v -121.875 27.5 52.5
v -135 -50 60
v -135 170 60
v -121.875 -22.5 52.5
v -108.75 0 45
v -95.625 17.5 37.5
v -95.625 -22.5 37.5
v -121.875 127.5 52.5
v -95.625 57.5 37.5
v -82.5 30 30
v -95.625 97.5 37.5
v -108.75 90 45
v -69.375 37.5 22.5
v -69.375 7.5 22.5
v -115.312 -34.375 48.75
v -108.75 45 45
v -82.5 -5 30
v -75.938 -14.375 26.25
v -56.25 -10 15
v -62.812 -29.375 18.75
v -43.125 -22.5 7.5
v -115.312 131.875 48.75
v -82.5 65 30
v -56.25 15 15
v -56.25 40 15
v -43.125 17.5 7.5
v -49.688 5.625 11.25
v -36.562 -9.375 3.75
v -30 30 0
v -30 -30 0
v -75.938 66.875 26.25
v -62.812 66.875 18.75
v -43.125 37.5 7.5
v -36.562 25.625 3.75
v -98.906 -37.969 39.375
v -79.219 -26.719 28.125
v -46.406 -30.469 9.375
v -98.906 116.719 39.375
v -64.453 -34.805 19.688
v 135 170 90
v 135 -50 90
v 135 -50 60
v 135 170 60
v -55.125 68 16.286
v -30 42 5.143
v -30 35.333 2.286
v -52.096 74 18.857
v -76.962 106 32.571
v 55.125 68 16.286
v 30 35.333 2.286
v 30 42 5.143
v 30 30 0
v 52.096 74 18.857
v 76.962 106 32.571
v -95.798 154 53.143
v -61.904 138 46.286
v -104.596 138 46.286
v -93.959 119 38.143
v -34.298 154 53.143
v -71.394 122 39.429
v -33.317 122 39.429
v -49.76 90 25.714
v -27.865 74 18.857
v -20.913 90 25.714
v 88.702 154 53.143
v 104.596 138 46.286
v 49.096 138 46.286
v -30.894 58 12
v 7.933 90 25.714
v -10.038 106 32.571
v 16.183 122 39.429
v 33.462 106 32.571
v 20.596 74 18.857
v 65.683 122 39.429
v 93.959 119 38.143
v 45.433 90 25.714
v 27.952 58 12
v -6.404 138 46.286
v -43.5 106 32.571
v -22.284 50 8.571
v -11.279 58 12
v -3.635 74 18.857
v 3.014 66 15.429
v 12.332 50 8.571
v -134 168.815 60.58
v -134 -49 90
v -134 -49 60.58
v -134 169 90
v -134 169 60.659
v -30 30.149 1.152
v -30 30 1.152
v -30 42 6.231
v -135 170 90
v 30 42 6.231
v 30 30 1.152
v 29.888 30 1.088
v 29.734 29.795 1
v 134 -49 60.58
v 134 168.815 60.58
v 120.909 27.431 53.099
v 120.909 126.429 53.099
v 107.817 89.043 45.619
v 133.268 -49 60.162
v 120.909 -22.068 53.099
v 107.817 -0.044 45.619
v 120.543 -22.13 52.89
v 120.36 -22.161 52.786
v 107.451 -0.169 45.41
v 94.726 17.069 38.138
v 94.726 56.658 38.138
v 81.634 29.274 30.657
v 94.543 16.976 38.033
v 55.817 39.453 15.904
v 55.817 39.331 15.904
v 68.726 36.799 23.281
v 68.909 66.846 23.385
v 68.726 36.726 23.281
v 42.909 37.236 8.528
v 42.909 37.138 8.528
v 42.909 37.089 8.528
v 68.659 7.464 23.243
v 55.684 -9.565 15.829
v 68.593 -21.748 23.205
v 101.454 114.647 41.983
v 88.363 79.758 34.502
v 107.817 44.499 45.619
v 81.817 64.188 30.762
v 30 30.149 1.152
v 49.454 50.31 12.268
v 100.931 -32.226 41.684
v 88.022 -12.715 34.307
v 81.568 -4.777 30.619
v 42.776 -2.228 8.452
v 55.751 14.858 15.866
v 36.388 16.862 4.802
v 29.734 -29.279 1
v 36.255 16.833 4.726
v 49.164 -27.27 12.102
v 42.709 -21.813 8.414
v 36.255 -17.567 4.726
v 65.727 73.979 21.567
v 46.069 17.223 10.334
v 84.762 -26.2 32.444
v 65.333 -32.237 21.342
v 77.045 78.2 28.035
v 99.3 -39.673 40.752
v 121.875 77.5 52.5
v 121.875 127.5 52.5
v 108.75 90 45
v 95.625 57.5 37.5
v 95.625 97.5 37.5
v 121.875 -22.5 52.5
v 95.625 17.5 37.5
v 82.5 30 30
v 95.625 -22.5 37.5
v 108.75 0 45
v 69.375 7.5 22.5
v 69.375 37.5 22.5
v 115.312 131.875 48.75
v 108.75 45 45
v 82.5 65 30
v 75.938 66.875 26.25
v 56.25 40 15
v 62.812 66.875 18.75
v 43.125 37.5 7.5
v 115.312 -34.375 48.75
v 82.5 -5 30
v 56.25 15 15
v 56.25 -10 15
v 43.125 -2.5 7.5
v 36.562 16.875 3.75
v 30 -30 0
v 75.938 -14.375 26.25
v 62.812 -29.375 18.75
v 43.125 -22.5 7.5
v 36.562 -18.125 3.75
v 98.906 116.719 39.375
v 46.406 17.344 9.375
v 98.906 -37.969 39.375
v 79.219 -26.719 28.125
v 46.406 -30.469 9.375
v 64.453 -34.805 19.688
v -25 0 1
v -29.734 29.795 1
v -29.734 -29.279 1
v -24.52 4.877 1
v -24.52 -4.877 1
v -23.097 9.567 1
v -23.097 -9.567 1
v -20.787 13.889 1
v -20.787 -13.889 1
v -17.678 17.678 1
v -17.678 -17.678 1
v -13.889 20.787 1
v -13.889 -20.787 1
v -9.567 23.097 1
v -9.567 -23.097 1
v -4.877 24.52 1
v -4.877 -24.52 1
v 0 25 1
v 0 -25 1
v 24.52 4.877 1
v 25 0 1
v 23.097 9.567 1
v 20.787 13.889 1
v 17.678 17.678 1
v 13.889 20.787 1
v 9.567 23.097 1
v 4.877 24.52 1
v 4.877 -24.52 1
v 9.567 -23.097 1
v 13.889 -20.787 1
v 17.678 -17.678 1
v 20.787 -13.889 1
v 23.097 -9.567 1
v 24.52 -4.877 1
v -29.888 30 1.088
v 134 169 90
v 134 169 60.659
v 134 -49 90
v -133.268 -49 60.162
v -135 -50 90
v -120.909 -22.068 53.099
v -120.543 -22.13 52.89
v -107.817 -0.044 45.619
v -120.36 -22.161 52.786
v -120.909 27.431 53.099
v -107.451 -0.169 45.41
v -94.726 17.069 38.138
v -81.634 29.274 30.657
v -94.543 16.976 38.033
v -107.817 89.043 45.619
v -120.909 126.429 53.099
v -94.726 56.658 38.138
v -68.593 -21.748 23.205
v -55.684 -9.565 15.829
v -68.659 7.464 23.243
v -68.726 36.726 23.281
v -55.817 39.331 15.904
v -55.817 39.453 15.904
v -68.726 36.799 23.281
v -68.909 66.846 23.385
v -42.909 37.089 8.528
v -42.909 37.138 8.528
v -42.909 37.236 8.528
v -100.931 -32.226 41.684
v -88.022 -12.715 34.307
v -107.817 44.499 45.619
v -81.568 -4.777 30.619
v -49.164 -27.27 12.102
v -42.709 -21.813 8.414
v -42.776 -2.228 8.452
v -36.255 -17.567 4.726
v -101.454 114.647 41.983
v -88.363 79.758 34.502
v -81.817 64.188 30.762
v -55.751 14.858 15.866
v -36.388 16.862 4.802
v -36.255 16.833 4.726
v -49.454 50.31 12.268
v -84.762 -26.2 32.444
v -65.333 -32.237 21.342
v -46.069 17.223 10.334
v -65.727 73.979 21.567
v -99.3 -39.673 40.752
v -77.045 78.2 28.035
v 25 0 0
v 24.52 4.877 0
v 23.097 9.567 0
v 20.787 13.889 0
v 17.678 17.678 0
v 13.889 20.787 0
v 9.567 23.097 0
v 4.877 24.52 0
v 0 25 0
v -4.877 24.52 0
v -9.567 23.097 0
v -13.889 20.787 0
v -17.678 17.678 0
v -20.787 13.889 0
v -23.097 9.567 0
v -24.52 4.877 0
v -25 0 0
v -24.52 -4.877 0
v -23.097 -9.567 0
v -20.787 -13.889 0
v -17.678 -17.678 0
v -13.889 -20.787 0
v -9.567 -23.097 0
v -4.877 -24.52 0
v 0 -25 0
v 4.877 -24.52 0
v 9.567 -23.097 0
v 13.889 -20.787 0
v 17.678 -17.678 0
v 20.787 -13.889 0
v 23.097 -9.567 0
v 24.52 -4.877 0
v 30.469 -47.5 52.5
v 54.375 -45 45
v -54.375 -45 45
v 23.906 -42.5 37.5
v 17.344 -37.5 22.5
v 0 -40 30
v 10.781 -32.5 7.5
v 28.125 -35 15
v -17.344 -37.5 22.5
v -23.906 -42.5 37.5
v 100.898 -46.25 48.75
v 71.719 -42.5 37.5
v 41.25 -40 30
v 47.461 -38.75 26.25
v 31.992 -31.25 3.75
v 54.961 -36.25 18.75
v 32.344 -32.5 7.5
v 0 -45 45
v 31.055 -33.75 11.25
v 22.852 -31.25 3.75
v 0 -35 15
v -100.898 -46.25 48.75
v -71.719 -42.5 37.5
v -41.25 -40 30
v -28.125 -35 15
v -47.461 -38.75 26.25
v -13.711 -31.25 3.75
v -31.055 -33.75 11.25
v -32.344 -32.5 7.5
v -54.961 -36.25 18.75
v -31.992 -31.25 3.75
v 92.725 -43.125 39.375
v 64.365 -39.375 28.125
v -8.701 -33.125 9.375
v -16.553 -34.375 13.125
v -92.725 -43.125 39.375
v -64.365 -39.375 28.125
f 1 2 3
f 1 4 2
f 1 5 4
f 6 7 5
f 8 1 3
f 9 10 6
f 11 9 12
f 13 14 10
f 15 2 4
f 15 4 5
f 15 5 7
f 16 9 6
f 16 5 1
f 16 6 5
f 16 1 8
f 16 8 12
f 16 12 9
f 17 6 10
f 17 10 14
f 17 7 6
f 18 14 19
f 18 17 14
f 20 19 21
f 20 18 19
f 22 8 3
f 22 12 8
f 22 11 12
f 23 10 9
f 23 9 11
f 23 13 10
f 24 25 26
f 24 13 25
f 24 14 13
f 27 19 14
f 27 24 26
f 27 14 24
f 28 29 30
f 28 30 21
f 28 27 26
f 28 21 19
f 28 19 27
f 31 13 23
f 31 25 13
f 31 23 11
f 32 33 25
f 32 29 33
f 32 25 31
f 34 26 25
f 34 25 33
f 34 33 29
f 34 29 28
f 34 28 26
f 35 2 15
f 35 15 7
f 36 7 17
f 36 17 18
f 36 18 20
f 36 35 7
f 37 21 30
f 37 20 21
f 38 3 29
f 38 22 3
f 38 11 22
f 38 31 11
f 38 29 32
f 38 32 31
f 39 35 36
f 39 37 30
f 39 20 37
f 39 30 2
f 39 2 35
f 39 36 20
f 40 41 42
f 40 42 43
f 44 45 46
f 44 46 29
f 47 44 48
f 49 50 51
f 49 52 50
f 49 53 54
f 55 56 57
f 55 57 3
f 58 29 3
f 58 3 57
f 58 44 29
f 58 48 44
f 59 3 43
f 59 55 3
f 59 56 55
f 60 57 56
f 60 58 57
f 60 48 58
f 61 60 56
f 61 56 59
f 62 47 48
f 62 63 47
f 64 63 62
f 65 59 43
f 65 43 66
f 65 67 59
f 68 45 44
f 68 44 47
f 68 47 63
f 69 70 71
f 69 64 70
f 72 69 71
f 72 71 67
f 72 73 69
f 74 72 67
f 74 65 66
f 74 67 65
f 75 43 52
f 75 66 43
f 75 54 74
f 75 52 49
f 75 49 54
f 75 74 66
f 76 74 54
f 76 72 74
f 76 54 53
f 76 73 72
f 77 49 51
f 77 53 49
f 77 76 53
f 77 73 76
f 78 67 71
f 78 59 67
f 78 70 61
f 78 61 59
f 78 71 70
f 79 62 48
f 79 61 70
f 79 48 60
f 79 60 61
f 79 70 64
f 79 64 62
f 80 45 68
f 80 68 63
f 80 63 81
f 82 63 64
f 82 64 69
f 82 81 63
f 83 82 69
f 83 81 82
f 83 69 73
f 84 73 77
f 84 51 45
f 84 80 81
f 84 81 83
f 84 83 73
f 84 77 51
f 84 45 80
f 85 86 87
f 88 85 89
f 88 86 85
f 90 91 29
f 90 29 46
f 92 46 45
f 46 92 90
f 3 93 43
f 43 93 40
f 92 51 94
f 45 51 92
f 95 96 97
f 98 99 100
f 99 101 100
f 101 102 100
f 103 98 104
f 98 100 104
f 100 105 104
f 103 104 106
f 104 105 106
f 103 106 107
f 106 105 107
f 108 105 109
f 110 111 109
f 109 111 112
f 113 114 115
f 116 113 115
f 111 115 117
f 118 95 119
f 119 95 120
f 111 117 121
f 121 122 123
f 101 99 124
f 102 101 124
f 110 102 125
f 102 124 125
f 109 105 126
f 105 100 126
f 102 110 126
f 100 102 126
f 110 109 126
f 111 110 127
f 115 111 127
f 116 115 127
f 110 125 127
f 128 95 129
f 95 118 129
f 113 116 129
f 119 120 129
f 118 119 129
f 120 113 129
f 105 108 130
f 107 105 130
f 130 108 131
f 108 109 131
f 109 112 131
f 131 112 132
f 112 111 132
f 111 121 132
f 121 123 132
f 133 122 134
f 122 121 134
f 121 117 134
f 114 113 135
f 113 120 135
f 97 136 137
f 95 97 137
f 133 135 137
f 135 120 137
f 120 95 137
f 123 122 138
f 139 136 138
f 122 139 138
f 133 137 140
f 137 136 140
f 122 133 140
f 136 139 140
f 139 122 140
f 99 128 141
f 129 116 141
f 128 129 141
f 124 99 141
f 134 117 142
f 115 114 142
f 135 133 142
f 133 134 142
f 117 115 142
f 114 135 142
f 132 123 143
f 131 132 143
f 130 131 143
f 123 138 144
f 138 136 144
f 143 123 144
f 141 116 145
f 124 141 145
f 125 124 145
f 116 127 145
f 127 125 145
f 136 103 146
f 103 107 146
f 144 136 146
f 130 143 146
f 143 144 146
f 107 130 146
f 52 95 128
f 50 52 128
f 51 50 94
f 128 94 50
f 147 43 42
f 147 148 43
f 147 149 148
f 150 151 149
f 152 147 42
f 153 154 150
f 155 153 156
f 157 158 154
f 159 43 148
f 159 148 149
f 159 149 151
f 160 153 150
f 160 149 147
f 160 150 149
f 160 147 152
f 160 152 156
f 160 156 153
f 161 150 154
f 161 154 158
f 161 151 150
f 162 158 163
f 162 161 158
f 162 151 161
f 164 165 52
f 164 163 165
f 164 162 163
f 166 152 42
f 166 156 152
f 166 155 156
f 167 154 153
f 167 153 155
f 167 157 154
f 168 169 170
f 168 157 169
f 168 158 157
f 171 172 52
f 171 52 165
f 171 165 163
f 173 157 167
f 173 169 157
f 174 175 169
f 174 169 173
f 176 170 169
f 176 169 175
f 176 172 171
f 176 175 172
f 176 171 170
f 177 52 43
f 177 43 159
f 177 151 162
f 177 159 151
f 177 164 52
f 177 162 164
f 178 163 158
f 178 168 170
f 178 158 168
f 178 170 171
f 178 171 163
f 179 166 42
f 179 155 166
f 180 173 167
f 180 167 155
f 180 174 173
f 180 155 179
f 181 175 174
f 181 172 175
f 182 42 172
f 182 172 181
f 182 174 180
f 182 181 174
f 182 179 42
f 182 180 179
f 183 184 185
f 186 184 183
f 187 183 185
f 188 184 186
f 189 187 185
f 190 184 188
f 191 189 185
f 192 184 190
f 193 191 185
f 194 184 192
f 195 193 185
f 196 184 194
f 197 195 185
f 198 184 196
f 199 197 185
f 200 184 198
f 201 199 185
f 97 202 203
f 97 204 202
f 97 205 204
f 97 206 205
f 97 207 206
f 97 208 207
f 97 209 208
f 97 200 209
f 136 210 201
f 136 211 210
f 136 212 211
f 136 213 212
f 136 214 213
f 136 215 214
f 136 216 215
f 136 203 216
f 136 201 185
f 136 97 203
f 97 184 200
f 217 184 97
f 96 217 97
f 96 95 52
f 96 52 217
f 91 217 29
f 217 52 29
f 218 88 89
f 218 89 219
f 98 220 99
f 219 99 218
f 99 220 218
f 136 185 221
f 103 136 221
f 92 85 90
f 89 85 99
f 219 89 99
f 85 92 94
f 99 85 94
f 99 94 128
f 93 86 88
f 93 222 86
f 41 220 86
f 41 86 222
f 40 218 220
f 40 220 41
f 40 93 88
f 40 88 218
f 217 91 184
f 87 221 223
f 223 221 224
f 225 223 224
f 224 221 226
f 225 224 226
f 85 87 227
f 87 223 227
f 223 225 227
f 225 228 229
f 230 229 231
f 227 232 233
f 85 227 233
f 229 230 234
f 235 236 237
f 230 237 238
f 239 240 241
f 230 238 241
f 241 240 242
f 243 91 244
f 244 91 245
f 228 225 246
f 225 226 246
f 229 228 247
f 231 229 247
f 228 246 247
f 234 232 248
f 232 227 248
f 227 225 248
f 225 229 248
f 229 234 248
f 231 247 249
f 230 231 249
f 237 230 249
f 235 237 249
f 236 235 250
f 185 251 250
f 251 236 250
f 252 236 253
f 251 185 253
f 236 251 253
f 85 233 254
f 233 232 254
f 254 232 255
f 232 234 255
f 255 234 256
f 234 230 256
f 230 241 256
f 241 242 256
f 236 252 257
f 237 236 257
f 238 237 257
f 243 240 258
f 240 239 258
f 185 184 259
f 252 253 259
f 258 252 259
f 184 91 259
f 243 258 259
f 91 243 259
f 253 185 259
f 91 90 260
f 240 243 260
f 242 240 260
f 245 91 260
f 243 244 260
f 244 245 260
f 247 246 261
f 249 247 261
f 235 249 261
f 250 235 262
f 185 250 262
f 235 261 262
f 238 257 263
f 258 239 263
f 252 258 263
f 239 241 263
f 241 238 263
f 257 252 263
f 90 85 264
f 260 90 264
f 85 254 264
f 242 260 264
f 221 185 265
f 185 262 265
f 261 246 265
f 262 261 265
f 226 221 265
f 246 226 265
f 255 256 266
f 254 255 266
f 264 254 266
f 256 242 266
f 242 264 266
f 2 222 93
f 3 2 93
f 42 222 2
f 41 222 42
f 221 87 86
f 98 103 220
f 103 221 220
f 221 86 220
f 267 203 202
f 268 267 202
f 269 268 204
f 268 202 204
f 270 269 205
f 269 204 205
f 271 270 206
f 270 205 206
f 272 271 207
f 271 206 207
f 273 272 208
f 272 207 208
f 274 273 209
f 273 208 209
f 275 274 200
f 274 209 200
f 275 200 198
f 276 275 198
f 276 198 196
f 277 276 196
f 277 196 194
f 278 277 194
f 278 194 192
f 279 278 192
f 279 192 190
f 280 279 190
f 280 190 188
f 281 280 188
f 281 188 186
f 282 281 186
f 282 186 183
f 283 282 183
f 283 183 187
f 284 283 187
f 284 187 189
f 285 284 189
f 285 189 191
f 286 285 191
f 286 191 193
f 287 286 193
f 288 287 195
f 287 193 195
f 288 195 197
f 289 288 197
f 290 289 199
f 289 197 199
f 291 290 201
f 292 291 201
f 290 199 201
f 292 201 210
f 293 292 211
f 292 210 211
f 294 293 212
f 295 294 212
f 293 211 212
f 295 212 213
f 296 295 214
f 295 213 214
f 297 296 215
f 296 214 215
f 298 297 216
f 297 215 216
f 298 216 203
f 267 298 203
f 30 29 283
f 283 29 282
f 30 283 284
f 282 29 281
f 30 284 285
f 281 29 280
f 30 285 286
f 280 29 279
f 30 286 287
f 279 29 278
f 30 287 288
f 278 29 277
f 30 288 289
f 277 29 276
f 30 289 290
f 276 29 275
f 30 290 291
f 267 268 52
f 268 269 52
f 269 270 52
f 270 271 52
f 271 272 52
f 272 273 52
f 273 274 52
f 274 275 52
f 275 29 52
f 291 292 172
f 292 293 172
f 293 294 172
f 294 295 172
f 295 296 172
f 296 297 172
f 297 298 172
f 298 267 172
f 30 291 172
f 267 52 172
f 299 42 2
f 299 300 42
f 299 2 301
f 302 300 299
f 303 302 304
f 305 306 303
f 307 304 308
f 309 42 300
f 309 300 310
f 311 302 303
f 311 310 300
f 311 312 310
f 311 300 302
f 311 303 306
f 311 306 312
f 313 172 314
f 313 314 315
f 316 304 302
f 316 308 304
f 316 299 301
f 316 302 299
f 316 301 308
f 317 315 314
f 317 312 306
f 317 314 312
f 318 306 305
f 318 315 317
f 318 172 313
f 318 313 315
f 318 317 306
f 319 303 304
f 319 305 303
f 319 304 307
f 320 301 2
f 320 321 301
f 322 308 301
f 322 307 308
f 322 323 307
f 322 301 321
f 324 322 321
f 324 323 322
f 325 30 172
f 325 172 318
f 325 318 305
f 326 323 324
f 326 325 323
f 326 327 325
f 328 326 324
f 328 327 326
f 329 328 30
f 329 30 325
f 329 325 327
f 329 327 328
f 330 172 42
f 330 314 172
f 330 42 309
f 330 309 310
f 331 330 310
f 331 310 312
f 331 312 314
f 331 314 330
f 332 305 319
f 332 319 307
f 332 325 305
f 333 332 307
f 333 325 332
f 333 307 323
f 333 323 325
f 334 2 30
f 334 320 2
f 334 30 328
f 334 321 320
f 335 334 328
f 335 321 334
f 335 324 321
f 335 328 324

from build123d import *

# Parameters (mm, degrees)
EXTRUDE_1_REACH     = 237
SKETCH_7_W          = 270
SKETCH_7_H          = 220
SHELL_1_T           = -1
SKETCH_8_R          = 25
CUT_EXTRUDE_2_DEPTH = 10
SKETCH_9_W          = 60
SKETCH_9_H          = 12
CUT_EXTRUDE_3_DEPTH = 10


with BuildPart() as part:
    # 草图2 → 放样1 section 0
    with BuildSketch(Plane.XY.offset(60)):
        with BuildLine():
            Line((-135, 170), (135, 170))
            Line((135, 170), (135, -50))
            Line((135, -50), (-135, -50))
            Line((-135, -50), (-135, 170))
        make_face()
    # 草图1 → 放样1 section 1
    with BuildSketch(Plane.XY):
        with BuildLine():
            Line((-30, 30), (30, 30))
            Line((30, 30), (30, -30))
            Line((30, -30), (-30, -30))
            Line((-30, -30), (-30, 30))
        make_face()
    loft()

    # 草图7 → 凸台-拉伸1 (add, up to next)
    with BuildSketch(Plane.XY.offset(90), mode=Mode.PRIVATE) as extrude_1_sk1:
        with Locations((0, 60)):
            Rectangle(SKETCH_7_W, SKETCH_7_H)
    extrude_1_tool1 = extrude(extrude_1_sk1.sketch, amount=-EXTRUDE_1_REACH, mode=Mode.PRIVATE) - part.part
    add(extrude_1_tool1.solids().sort_by_distance((0, 60, 90))[0])

    # 抽壳1
    shell_1_openings = [part.faces().sort_by_distance(p)[0] for p in [
        (0, 60, 90),
    ]]
    offset(amount=SHELL_1_T, openings=shell_1_openings)

    # 草图8 → 切除-拉伸2 (cut)
    with BuildSketch(Plane.XY.offset(1)):
        Circle(SKETCH_8_R)
    extrude(amount=-CUT_EXTRUDE_2_DEPTH, mode=Mode.SUBTRACT)

    # 草图9 → 切除-拉伸3 (cut)
    with BuildSketch(Plane(origin=(0, 0, 0), x_dir=(-1, 0, 0), z_dir=(0, 0, -1))):
        with Locations((0, 36)):
            Rectangle(SKETCH_9_W, SKETCH_9_H)
    extrude(amount=-CUT_EXTRUDE_3_DEPTH, mode=Mode.SUBTRACT)


solid = part.part
